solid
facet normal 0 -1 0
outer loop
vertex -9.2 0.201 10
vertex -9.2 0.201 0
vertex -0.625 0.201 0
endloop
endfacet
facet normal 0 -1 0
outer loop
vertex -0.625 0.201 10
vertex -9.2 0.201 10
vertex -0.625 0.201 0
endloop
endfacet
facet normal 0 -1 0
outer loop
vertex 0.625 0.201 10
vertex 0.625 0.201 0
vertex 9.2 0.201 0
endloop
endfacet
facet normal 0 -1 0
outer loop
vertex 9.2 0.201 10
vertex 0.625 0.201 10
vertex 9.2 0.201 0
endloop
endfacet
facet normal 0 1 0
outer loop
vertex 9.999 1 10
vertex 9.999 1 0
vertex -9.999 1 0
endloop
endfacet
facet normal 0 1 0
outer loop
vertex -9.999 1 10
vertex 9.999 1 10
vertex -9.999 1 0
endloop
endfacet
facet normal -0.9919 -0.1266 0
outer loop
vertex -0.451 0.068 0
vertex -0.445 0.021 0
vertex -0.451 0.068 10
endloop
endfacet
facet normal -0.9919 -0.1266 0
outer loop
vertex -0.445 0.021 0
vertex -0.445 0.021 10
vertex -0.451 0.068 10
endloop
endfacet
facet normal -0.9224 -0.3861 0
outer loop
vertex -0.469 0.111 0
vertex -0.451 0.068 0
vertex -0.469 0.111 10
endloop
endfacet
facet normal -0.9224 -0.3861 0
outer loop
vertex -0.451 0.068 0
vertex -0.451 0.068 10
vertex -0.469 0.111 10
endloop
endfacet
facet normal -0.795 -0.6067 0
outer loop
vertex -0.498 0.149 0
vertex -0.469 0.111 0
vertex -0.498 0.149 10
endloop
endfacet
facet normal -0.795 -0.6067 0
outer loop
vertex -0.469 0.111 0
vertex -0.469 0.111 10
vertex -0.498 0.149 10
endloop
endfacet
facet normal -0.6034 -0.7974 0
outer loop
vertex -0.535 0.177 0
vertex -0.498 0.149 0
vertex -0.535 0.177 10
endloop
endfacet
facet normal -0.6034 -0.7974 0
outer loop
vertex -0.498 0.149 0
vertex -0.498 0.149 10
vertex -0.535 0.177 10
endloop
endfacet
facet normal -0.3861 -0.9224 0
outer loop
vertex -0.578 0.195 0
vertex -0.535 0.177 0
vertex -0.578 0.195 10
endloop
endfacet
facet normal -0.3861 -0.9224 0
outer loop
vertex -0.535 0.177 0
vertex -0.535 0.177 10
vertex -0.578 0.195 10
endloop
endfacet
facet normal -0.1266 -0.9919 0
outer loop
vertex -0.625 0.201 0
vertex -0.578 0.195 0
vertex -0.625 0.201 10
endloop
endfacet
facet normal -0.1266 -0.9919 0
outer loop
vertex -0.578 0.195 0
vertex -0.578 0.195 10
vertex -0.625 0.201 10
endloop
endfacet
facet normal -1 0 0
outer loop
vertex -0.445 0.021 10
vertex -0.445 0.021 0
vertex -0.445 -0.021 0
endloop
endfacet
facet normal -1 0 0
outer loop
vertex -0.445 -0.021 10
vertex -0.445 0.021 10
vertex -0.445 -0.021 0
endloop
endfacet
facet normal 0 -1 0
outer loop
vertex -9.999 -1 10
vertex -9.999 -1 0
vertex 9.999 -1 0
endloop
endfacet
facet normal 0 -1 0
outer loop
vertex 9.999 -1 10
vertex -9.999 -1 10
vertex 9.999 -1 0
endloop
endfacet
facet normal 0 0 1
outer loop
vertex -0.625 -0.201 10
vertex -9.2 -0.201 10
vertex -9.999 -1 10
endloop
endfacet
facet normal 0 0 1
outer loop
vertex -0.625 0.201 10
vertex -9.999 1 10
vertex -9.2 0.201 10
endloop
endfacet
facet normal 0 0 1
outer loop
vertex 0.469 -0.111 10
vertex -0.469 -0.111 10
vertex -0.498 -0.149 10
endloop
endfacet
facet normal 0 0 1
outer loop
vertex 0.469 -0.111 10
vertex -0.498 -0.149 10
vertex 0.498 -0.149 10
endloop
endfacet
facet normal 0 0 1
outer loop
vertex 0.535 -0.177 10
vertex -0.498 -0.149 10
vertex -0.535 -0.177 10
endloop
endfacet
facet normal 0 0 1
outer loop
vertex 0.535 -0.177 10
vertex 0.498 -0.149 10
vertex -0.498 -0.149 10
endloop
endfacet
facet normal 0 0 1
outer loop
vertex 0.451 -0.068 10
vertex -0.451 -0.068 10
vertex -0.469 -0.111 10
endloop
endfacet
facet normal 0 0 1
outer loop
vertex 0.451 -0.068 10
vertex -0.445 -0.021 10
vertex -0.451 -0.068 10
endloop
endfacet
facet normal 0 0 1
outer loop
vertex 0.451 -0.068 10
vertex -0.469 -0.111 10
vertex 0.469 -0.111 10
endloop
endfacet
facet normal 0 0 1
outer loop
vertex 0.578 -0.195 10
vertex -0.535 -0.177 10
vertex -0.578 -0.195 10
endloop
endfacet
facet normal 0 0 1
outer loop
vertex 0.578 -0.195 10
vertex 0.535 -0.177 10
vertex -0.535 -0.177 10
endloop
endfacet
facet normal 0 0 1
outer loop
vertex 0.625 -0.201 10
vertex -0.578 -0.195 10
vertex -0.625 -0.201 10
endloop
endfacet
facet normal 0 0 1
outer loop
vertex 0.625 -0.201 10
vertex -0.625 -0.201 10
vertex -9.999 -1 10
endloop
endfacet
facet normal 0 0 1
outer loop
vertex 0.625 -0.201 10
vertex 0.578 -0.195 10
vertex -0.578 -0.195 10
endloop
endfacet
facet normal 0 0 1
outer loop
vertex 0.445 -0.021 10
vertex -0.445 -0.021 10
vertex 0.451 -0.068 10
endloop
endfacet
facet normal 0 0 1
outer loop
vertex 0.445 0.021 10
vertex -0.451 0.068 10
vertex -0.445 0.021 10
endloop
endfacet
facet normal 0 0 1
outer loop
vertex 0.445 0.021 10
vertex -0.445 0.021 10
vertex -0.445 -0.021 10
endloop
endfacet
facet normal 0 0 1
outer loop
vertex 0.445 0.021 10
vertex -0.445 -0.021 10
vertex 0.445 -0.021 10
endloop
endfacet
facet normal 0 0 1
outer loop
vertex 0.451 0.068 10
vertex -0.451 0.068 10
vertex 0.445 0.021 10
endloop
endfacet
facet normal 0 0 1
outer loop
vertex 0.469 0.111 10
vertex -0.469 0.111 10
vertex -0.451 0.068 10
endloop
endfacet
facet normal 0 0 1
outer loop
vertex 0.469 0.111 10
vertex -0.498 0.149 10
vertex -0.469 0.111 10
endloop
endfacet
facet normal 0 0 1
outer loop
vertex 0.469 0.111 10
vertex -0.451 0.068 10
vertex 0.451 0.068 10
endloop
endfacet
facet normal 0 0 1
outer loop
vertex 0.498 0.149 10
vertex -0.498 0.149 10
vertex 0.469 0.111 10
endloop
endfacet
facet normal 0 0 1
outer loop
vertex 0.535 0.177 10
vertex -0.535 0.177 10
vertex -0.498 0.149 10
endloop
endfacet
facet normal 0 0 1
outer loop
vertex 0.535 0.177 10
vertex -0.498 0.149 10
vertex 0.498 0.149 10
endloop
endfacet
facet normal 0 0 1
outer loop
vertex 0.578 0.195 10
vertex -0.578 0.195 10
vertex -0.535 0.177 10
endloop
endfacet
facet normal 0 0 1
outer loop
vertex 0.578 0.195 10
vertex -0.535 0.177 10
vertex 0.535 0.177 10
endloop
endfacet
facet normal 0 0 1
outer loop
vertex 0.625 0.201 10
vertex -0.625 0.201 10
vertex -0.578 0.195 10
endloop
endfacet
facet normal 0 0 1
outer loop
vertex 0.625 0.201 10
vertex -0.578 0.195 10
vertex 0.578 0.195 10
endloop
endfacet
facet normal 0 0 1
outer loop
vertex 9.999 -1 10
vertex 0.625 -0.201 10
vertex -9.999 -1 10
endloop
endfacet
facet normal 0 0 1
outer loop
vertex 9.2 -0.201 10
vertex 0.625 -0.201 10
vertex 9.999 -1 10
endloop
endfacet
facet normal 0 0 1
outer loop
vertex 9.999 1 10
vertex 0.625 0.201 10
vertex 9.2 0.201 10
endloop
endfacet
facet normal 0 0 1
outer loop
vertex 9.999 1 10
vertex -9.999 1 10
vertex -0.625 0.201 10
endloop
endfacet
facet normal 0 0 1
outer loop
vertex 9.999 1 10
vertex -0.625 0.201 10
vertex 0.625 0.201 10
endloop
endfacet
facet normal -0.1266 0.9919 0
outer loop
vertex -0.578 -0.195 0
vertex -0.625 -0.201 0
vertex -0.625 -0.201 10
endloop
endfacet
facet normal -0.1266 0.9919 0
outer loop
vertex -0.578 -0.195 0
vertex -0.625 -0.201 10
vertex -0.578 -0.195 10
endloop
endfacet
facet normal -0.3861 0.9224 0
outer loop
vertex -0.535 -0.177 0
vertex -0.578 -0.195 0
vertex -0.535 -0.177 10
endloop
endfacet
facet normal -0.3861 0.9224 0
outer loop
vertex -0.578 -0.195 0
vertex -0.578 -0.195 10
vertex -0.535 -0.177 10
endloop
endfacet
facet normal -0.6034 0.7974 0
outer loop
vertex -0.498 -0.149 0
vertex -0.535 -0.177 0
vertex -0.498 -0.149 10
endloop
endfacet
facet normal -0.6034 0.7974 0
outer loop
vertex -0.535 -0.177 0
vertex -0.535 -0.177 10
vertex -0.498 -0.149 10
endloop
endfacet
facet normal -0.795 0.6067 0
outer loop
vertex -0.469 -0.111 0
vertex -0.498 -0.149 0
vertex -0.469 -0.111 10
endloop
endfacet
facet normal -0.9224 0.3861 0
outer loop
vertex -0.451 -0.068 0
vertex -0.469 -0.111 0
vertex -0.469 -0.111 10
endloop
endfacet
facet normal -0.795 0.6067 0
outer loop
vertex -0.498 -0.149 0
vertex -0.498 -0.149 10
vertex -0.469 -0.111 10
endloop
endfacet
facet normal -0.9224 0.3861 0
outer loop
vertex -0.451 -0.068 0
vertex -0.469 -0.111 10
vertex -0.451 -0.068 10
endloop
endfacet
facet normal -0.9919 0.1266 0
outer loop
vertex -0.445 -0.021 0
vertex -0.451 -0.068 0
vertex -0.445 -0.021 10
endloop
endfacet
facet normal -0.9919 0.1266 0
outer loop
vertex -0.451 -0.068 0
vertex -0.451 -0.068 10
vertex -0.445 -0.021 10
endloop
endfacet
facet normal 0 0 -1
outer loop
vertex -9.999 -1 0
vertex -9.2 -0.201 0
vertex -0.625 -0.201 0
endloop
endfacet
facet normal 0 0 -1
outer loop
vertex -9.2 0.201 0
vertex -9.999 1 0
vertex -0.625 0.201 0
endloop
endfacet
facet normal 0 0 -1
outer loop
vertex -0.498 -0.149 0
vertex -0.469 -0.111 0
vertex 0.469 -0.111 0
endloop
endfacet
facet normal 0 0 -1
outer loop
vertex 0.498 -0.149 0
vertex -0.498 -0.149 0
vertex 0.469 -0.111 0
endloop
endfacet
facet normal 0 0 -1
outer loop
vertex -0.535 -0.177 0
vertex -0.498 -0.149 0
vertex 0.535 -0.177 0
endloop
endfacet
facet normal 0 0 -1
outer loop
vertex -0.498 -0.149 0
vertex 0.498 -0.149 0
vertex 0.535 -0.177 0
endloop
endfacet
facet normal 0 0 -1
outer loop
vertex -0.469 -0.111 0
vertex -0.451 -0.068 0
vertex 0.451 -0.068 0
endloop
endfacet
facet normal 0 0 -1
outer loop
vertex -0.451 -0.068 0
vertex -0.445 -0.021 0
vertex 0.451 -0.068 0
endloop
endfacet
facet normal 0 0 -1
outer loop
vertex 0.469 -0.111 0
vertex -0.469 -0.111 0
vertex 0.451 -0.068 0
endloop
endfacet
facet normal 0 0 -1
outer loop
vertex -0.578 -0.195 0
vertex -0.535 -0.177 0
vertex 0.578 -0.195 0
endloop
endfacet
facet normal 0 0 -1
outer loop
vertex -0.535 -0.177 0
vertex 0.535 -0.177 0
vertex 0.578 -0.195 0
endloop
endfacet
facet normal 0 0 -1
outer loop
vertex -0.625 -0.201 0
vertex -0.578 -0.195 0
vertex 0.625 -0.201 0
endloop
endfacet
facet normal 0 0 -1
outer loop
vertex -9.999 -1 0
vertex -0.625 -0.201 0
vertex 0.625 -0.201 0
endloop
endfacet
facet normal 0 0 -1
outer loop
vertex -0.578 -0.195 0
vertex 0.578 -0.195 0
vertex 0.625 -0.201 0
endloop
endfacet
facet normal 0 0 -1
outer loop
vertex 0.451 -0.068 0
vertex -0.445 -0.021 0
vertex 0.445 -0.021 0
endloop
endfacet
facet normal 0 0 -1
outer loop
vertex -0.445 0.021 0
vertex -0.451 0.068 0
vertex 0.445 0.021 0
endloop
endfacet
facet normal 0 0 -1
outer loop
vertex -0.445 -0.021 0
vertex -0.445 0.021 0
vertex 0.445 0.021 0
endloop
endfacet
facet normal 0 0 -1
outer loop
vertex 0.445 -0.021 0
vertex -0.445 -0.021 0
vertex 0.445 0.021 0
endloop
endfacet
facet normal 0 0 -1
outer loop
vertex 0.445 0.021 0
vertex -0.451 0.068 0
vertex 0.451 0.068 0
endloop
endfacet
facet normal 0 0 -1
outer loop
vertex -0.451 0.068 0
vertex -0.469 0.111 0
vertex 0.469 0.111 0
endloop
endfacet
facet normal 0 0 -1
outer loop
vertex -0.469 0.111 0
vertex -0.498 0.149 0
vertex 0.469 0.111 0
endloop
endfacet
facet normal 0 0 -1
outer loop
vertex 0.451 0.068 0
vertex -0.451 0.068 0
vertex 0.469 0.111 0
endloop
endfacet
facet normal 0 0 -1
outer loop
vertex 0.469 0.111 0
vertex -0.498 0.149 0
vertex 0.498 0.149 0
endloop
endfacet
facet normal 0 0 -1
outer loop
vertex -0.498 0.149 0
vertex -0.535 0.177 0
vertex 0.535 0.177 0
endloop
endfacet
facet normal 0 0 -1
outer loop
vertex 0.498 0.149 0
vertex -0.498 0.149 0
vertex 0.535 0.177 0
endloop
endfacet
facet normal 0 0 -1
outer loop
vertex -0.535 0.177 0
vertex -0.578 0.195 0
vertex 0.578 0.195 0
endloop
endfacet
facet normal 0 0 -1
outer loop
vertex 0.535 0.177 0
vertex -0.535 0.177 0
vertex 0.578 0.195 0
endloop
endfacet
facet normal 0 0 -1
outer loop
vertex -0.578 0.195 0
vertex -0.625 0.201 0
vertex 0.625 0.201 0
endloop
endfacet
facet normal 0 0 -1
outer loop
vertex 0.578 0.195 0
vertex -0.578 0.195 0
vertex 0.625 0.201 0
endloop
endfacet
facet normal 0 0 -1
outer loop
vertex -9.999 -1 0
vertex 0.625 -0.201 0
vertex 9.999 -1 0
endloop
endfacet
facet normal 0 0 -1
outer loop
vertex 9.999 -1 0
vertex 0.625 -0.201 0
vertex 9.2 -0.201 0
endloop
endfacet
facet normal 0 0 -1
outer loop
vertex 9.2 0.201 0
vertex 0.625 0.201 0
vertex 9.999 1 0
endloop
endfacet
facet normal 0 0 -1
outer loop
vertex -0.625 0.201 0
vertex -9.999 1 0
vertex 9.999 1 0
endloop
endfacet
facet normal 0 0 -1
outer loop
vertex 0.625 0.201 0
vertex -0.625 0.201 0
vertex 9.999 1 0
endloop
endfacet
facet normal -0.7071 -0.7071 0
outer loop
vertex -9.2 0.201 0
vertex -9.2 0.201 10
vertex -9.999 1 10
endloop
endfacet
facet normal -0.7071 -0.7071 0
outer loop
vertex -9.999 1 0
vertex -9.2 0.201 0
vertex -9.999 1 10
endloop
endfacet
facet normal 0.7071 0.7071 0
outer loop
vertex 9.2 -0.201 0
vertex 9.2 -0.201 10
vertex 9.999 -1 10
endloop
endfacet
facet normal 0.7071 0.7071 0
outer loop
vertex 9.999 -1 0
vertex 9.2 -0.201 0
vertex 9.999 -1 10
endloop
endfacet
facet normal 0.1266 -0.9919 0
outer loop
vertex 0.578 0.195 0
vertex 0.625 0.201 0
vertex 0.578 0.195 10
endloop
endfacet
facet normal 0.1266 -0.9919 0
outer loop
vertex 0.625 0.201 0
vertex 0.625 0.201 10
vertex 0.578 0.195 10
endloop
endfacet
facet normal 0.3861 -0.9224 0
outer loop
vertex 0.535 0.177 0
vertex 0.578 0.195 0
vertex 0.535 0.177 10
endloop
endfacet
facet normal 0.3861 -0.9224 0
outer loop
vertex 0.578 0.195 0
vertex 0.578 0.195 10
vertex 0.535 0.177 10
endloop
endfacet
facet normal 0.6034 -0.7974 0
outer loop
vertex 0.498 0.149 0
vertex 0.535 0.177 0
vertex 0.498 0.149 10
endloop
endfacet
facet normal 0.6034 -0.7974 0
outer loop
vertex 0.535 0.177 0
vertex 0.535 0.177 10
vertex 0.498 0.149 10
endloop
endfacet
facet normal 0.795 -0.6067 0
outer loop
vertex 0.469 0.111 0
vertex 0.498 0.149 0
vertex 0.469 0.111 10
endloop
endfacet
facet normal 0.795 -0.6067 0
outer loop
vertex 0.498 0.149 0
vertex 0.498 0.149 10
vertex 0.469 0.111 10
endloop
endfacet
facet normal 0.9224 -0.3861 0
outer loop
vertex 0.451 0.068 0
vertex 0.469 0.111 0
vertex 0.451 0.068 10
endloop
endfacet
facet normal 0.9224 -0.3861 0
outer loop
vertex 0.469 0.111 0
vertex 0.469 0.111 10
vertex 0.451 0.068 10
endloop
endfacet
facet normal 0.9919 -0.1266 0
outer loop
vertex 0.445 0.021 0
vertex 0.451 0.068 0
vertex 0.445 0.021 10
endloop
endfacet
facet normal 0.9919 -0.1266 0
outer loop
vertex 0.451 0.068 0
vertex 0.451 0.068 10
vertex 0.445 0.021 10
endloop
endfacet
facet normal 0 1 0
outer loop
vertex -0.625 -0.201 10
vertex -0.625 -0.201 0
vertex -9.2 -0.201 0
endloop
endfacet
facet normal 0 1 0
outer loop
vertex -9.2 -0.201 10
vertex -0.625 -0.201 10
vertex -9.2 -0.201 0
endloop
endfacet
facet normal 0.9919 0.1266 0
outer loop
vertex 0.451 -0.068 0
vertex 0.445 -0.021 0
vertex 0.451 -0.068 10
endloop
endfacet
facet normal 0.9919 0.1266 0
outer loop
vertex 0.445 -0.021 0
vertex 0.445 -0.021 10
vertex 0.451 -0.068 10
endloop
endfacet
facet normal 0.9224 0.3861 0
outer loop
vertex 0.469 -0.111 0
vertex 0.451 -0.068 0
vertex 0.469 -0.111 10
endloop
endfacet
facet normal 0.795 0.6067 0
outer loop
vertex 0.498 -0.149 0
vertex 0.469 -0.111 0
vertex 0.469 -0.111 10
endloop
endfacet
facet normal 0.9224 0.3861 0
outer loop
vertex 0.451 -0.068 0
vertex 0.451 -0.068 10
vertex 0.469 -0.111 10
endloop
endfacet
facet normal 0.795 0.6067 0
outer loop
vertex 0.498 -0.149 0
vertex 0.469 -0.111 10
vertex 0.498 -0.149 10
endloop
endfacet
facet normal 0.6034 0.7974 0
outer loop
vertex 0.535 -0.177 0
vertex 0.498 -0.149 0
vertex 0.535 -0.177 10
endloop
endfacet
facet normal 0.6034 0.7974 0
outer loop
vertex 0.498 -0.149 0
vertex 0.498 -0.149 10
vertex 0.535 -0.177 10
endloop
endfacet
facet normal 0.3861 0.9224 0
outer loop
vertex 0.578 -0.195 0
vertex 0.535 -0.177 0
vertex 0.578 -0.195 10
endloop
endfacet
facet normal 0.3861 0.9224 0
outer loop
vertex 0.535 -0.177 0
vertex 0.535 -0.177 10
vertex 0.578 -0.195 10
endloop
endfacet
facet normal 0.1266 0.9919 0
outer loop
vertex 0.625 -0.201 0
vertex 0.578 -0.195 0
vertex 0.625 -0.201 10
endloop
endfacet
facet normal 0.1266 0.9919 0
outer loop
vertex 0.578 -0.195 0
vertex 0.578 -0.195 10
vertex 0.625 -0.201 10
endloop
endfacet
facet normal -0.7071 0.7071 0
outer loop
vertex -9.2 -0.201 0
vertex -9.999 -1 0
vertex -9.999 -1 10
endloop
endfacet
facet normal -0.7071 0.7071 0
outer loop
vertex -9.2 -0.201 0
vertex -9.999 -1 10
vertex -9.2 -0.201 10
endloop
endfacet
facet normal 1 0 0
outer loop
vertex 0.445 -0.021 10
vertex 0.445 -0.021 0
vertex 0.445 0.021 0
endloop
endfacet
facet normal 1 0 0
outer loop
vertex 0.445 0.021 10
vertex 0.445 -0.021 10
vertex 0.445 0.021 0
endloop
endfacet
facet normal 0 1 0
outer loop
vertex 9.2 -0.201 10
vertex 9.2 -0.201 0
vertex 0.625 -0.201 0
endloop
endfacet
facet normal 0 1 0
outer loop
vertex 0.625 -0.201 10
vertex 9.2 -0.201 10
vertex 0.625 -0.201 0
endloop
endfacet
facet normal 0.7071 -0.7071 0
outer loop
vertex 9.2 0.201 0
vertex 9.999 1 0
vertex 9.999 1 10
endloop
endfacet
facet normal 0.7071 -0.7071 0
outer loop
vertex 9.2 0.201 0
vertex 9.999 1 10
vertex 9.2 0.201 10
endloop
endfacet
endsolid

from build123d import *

# Parameters (mm, degrees)
F1_DEPTH    = 10
F2_T1_DEPTH = 14.1146927807
F3_R        = 0.18


# Not quite as in the source:
# - a fillet or chamfer that OpenCascade refuses, or shapes differently, is made with other operations: its cross-section is extruded or revolved along the edge and cut away or added


with BuildPart() as f1:
    # F0 (on Top) → F1 (new body)
    with BuildSketch(Plane.XY):
        Polygon((10, 0.2012402692), (10, 1), (0.4449767875, 1), (-0.4449767875, 1), (-10, 1), (-10, 0.2012402692), (-0.4449767875, 0.2012402692), (-0.4449767875, -0.2012402692), (-10, -0.2012402692), (-10, -1), (-0.4449767875, -1), (0.4449767875, -1), (10, -1), (10, -0.2012402692), (0.4449767875, -0.2012402692), (0.4449767875, 0.2012402692), align=None)
    extrude(amount=F1_DEPTH)

    # F2: chamfer of 0.8 on 4 edges, made by hand

    # F2_s2 → F2_t1 (cut)
    with BuildSketch(Plane.XY.offset(-2.0573463904)):
        Polygon((-10, -1.0012402692), (-9.2, -0.2012402692), (-10, -0.2012402692), align=None)
        Polygon((-9.2, 0.2012402692), (-10, 1.0012402692), (-10, 0.2012402692), align=None)
        Polygon((9.2, -0.2012402692), (10, -1.0012402692), (10, -0.2012402692), align=None)
        Polygon((10, 1.0012402692), (9.2, 0.2012402692), (10, 0.2012402692), align=None)
    extrude(amount=F2_T1_DEPTH, mode=Mode.SUBTRACT)

    # F3
    f3_edges = [f1.edges().sort_by_distance(p)[0] for p in [
        (-0.444977, -0.20124, 5),
        (-0.444977, 0.20124, 5),
        (0.444977, 0.20124, 5),
        (0.444977, -0.20124, 5),
    ]]
    fillet(f3_edges, radius=F3_R)


solid = f1.part
